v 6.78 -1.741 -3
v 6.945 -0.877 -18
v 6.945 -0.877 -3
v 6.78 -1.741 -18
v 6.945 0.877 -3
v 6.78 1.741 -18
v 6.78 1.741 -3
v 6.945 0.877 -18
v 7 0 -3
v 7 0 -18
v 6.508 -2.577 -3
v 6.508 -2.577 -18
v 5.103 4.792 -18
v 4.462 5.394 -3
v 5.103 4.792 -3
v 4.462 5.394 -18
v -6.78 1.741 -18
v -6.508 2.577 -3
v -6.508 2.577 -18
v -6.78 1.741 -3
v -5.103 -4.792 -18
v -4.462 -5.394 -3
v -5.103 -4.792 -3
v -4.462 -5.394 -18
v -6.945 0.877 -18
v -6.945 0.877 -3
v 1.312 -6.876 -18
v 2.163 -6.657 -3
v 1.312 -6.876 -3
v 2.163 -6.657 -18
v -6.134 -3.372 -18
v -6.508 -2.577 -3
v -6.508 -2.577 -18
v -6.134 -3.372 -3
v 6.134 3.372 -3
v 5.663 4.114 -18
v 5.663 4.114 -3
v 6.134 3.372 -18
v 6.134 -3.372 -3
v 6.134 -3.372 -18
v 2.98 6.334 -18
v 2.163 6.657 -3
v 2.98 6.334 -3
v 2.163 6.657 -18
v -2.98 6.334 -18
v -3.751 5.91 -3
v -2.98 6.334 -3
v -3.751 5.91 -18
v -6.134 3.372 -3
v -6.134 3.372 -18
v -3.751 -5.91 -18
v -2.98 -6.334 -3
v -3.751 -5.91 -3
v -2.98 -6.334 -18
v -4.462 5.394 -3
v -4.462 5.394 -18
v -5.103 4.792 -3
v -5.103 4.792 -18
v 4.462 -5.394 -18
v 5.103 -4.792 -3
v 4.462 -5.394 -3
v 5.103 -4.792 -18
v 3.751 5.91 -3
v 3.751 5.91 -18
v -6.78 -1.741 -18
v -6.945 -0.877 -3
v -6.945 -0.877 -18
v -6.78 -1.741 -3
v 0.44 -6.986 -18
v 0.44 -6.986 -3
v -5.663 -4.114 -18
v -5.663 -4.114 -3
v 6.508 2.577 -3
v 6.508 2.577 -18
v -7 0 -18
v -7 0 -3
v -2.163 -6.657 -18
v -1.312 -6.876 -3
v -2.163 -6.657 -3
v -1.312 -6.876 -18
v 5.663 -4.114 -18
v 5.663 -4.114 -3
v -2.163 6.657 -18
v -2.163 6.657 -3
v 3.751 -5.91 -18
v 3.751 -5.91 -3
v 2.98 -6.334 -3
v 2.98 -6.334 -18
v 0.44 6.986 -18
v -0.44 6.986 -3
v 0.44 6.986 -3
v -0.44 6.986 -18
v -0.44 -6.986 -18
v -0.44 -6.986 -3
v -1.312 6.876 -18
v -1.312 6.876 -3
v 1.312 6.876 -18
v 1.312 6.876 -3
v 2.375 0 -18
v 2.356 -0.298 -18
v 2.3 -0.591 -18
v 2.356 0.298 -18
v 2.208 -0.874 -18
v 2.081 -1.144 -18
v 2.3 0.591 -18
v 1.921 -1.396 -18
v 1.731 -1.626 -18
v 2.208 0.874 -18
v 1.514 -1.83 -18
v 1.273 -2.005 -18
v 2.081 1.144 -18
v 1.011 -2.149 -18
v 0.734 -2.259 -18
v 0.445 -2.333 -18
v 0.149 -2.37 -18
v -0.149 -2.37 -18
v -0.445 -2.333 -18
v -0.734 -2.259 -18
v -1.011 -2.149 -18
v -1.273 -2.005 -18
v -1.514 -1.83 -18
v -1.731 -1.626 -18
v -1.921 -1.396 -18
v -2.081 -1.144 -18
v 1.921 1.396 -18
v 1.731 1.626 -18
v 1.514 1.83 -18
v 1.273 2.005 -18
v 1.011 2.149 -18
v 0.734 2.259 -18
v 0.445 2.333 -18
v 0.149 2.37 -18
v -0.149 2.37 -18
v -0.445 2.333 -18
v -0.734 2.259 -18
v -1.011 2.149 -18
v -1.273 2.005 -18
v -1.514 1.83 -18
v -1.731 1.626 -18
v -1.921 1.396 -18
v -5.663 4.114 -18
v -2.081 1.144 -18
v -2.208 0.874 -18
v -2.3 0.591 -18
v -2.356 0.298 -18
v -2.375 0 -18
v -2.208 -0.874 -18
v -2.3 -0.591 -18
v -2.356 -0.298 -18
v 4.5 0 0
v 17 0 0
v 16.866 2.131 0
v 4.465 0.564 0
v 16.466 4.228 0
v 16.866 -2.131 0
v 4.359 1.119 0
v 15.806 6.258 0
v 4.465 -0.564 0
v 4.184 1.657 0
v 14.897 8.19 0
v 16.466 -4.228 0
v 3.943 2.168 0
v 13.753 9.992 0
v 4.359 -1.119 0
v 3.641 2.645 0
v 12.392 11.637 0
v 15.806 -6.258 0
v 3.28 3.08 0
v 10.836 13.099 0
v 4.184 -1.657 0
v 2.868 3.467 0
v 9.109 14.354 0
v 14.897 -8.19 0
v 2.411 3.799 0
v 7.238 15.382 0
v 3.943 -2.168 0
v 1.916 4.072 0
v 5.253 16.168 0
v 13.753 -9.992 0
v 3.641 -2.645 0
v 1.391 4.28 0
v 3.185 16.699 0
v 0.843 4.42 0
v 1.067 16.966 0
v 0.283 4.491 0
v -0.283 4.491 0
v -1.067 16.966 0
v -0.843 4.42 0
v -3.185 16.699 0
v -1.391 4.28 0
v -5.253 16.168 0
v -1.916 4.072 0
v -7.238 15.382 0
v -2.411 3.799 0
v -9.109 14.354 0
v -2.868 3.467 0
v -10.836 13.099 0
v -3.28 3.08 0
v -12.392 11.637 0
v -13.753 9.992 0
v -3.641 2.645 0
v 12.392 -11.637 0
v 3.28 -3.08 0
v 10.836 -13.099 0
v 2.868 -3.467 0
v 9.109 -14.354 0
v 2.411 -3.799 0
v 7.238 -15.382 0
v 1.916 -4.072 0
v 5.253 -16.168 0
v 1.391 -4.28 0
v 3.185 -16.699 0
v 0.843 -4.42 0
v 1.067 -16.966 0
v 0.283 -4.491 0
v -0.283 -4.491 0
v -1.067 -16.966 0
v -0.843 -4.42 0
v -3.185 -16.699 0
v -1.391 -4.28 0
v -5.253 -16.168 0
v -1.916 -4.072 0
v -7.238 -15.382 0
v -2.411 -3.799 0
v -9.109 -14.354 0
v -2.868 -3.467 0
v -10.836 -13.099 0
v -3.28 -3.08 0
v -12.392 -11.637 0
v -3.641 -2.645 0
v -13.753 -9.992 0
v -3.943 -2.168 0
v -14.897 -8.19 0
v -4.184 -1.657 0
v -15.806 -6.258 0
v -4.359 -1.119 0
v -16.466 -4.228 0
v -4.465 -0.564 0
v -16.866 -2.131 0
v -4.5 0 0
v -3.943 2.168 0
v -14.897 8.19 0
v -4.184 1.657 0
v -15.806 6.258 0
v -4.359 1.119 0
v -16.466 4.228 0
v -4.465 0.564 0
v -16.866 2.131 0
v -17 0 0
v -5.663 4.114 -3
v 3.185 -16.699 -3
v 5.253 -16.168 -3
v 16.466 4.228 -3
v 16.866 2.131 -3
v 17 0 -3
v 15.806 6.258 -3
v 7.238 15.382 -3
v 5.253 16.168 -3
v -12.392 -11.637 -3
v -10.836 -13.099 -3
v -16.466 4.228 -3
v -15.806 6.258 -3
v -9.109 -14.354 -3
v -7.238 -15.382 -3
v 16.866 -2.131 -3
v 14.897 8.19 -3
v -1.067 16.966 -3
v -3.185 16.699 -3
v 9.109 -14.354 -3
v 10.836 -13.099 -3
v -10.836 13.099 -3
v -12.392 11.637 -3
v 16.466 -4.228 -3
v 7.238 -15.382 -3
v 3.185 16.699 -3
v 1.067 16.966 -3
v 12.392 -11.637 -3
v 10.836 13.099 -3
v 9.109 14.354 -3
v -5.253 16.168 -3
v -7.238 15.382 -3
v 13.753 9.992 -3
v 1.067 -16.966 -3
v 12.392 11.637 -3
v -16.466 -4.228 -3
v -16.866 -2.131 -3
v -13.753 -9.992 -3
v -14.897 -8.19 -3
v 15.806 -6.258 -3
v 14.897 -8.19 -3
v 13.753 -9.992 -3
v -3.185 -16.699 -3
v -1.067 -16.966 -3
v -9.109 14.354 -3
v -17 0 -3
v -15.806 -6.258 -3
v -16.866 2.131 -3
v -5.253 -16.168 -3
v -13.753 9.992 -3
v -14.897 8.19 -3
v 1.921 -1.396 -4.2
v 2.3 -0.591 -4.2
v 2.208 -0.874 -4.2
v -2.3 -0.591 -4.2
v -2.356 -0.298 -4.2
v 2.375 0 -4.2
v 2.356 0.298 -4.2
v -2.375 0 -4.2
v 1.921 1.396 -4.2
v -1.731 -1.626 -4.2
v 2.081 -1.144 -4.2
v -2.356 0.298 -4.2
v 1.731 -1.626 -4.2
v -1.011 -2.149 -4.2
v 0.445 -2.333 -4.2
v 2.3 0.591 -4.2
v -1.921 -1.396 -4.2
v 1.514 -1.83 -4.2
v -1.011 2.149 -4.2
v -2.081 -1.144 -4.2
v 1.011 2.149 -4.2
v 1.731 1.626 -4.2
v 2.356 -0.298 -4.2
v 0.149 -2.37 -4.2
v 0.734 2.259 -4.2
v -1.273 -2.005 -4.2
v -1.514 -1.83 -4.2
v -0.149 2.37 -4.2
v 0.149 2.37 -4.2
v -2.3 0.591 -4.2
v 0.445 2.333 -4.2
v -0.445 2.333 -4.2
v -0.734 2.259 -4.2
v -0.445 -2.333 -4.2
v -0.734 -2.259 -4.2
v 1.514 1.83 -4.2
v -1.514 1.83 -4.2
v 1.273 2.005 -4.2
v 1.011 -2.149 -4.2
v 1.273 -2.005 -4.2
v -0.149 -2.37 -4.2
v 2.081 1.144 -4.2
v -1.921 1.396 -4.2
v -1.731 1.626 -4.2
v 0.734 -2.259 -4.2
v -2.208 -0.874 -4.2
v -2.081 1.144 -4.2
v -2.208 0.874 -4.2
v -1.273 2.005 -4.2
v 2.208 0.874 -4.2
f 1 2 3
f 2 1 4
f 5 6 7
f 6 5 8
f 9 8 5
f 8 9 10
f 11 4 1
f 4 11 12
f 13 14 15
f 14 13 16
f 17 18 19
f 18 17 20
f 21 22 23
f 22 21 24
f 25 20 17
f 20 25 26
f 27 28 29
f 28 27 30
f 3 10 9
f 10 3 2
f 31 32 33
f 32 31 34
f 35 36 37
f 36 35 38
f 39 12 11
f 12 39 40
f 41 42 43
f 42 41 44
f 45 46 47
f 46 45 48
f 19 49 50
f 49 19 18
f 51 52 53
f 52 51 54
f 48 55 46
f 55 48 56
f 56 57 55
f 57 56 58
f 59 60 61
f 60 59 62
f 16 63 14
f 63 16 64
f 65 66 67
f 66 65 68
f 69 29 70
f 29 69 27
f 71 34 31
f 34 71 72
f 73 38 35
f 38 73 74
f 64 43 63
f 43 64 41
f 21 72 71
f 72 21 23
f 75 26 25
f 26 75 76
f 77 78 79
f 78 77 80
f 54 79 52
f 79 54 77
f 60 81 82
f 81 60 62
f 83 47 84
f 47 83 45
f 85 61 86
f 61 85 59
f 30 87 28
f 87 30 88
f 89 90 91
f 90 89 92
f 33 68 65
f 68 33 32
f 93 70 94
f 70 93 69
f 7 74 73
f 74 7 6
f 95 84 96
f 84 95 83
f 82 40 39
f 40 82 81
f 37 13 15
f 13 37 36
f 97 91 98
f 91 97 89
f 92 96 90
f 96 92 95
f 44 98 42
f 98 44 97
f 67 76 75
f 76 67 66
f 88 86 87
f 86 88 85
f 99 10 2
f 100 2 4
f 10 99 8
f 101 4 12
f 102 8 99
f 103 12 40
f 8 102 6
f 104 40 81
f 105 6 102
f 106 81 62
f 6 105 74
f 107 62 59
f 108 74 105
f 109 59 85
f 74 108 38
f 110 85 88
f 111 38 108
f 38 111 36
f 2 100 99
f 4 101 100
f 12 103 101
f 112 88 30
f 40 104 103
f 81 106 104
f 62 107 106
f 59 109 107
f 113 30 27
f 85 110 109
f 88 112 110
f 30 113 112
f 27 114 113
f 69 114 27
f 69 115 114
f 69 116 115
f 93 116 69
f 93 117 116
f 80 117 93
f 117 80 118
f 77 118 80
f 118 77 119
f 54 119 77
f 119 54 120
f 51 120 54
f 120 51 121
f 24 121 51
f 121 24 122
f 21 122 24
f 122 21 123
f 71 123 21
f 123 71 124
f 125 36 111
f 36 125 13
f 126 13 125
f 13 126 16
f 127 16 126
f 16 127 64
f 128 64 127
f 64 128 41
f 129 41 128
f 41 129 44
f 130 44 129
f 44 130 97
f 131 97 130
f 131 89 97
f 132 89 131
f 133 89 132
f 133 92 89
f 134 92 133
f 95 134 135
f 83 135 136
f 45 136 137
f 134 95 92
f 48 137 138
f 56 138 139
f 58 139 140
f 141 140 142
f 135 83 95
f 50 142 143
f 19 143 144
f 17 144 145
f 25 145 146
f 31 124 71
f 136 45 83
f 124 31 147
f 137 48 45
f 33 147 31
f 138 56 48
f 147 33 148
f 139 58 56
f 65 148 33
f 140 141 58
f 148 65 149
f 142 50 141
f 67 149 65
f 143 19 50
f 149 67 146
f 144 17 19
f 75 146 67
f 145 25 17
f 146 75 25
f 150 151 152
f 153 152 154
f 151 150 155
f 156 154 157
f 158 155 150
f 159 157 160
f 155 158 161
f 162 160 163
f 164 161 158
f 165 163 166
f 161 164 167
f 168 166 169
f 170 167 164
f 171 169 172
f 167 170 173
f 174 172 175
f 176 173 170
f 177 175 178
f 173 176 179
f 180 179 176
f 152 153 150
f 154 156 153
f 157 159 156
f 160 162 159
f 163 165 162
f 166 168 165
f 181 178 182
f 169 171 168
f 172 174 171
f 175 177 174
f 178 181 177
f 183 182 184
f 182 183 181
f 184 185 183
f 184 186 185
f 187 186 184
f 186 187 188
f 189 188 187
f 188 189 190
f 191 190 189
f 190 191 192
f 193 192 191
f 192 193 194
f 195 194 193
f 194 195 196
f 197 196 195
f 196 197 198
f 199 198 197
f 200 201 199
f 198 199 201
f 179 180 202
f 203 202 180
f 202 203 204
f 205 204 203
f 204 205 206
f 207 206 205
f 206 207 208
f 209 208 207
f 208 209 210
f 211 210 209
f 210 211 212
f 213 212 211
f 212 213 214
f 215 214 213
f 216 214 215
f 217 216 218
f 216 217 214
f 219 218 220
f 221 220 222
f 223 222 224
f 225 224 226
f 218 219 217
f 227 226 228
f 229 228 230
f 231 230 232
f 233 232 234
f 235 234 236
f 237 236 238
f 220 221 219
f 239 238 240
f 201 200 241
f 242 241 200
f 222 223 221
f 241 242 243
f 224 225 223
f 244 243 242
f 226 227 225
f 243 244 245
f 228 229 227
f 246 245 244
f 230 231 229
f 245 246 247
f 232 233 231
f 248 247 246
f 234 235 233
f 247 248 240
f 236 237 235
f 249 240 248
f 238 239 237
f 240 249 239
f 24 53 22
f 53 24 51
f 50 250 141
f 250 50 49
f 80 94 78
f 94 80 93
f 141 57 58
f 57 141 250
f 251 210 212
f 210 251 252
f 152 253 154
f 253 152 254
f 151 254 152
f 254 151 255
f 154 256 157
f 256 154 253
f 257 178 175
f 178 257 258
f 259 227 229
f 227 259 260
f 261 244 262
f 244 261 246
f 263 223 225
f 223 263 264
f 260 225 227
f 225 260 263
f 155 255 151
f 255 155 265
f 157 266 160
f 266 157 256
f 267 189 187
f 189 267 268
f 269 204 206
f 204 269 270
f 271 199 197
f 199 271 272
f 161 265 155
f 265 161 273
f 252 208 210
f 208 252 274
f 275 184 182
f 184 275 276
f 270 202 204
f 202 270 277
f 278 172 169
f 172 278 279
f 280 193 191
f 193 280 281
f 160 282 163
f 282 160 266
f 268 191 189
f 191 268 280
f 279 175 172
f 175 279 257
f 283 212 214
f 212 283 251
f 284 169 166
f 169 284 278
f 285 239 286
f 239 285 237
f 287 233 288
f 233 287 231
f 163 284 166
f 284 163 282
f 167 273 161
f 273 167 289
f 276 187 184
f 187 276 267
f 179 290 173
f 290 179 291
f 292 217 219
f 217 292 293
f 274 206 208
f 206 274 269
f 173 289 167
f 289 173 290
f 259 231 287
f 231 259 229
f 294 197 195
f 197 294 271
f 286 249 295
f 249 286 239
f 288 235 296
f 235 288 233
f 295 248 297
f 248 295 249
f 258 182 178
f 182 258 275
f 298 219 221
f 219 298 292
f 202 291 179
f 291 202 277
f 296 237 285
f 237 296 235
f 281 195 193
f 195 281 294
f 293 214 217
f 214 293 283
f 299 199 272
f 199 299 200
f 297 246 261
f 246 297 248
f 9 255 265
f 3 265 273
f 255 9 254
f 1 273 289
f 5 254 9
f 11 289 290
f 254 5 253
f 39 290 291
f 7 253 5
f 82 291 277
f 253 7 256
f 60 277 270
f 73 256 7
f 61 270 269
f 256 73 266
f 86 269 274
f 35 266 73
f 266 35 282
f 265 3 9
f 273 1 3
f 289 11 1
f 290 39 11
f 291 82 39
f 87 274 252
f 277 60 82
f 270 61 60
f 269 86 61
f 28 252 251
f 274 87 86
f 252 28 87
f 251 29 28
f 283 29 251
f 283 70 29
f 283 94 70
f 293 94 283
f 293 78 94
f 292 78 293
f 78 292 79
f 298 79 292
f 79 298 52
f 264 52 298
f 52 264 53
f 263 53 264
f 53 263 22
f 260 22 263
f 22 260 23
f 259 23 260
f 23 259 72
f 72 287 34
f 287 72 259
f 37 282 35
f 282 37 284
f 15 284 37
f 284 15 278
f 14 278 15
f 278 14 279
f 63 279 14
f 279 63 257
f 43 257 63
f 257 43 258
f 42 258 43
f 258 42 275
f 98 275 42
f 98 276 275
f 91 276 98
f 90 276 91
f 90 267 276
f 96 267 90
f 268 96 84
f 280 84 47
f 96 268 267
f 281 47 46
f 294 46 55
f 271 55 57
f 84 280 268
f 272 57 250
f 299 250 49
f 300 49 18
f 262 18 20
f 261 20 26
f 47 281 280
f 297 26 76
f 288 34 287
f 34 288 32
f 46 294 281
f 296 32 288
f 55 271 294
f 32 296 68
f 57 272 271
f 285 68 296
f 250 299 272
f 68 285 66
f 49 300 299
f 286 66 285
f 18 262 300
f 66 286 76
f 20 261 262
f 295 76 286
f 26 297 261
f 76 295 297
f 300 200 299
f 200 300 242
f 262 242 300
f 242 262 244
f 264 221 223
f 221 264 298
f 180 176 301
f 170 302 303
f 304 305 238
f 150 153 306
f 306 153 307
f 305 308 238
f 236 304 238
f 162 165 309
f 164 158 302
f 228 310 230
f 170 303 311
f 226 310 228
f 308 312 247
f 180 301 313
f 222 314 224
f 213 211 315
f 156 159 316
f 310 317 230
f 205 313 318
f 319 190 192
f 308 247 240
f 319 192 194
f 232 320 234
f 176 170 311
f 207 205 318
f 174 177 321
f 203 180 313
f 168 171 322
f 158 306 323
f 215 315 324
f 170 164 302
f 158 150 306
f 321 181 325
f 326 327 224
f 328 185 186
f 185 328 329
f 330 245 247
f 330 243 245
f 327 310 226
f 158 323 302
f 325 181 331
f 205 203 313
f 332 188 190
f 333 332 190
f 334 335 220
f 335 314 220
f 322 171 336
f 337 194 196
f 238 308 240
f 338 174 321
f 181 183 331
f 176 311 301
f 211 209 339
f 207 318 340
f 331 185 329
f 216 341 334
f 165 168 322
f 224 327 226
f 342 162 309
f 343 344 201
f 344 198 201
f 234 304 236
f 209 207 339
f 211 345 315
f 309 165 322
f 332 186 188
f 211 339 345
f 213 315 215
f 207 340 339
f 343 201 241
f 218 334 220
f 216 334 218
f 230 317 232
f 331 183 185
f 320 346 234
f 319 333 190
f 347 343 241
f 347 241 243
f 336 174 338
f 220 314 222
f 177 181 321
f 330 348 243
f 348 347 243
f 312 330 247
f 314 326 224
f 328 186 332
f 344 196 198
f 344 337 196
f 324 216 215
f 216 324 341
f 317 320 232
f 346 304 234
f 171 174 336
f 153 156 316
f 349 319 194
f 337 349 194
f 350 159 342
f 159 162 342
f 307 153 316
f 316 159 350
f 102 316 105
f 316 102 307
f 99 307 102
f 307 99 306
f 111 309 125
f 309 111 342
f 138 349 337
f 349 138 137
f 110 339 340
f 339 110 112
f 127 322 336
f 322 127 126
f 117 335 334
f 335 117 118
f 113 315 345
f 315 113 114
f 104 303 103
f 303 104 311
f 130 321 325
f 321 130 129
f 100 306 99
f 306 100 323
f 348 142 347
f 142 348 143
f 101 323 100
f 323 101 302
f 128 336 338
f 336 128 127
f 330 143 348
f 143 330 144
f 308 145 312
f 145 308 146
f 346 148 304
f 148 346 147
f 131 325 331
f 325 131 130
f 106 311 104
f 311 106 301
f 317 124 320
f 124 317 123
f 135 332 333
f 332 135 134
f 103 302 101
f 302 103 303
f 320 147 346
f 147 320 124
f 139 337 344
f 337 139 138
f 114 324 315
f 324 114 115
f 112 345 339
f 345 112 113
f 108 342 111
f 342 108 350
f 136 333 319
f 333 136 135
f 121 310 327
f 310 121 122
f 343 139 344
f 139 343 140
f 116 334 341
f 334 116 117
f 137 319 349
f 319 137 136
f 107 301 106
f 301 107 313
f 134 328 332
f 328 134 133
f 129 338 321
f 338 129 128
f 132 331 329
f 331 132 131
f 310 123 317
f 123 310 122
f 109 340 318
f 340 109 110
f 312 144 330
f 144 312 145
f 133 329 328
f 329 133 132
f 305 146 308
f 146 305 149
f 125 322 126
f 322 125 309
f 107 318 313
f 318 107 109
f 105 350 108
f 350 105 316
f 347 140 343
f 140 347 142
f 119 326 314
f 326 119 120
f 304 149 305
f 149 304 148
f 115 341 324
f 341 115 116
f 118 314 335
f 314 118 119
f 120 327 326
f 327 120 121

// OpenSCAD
$fn = 50;


difference() {
	union() {
		translate(v = [0, 0, -18.0000000000]) {
			cylinder(h = 18, r = 7.0000000000);
		}
		translate(v = [0, 0, -3.0000000000]) {
			cylinder(h = 3, r = 17.0000000000);
		}
	}
	union() {
		translate(v = [0, 0, 0]) {
			rotate(a = [0, 0, 0]) {
				difference() {
					union() {
						#translate(v = [0, 0, -18.0000000000]) {
							cylinder(h = 18, r = 2.2500000000);
						}
						#translate(v = [0, 0, -4.2000000000]) {
							cylinder(h = 4.2000000000, r1 = 2.3750000000, r2 = 4.5000000000);
						}
						#translate(v = [0, 0, -18.0000000000]) {
							cylinder(h = 18, r = 2.3750000000);
						}
						#translate(v = [0, 0, -18.0000000000]) {
							cylinder(h = 18, r = 2.2500000000);
						}
					}
					union();
				}
			}
		}
	}
}
